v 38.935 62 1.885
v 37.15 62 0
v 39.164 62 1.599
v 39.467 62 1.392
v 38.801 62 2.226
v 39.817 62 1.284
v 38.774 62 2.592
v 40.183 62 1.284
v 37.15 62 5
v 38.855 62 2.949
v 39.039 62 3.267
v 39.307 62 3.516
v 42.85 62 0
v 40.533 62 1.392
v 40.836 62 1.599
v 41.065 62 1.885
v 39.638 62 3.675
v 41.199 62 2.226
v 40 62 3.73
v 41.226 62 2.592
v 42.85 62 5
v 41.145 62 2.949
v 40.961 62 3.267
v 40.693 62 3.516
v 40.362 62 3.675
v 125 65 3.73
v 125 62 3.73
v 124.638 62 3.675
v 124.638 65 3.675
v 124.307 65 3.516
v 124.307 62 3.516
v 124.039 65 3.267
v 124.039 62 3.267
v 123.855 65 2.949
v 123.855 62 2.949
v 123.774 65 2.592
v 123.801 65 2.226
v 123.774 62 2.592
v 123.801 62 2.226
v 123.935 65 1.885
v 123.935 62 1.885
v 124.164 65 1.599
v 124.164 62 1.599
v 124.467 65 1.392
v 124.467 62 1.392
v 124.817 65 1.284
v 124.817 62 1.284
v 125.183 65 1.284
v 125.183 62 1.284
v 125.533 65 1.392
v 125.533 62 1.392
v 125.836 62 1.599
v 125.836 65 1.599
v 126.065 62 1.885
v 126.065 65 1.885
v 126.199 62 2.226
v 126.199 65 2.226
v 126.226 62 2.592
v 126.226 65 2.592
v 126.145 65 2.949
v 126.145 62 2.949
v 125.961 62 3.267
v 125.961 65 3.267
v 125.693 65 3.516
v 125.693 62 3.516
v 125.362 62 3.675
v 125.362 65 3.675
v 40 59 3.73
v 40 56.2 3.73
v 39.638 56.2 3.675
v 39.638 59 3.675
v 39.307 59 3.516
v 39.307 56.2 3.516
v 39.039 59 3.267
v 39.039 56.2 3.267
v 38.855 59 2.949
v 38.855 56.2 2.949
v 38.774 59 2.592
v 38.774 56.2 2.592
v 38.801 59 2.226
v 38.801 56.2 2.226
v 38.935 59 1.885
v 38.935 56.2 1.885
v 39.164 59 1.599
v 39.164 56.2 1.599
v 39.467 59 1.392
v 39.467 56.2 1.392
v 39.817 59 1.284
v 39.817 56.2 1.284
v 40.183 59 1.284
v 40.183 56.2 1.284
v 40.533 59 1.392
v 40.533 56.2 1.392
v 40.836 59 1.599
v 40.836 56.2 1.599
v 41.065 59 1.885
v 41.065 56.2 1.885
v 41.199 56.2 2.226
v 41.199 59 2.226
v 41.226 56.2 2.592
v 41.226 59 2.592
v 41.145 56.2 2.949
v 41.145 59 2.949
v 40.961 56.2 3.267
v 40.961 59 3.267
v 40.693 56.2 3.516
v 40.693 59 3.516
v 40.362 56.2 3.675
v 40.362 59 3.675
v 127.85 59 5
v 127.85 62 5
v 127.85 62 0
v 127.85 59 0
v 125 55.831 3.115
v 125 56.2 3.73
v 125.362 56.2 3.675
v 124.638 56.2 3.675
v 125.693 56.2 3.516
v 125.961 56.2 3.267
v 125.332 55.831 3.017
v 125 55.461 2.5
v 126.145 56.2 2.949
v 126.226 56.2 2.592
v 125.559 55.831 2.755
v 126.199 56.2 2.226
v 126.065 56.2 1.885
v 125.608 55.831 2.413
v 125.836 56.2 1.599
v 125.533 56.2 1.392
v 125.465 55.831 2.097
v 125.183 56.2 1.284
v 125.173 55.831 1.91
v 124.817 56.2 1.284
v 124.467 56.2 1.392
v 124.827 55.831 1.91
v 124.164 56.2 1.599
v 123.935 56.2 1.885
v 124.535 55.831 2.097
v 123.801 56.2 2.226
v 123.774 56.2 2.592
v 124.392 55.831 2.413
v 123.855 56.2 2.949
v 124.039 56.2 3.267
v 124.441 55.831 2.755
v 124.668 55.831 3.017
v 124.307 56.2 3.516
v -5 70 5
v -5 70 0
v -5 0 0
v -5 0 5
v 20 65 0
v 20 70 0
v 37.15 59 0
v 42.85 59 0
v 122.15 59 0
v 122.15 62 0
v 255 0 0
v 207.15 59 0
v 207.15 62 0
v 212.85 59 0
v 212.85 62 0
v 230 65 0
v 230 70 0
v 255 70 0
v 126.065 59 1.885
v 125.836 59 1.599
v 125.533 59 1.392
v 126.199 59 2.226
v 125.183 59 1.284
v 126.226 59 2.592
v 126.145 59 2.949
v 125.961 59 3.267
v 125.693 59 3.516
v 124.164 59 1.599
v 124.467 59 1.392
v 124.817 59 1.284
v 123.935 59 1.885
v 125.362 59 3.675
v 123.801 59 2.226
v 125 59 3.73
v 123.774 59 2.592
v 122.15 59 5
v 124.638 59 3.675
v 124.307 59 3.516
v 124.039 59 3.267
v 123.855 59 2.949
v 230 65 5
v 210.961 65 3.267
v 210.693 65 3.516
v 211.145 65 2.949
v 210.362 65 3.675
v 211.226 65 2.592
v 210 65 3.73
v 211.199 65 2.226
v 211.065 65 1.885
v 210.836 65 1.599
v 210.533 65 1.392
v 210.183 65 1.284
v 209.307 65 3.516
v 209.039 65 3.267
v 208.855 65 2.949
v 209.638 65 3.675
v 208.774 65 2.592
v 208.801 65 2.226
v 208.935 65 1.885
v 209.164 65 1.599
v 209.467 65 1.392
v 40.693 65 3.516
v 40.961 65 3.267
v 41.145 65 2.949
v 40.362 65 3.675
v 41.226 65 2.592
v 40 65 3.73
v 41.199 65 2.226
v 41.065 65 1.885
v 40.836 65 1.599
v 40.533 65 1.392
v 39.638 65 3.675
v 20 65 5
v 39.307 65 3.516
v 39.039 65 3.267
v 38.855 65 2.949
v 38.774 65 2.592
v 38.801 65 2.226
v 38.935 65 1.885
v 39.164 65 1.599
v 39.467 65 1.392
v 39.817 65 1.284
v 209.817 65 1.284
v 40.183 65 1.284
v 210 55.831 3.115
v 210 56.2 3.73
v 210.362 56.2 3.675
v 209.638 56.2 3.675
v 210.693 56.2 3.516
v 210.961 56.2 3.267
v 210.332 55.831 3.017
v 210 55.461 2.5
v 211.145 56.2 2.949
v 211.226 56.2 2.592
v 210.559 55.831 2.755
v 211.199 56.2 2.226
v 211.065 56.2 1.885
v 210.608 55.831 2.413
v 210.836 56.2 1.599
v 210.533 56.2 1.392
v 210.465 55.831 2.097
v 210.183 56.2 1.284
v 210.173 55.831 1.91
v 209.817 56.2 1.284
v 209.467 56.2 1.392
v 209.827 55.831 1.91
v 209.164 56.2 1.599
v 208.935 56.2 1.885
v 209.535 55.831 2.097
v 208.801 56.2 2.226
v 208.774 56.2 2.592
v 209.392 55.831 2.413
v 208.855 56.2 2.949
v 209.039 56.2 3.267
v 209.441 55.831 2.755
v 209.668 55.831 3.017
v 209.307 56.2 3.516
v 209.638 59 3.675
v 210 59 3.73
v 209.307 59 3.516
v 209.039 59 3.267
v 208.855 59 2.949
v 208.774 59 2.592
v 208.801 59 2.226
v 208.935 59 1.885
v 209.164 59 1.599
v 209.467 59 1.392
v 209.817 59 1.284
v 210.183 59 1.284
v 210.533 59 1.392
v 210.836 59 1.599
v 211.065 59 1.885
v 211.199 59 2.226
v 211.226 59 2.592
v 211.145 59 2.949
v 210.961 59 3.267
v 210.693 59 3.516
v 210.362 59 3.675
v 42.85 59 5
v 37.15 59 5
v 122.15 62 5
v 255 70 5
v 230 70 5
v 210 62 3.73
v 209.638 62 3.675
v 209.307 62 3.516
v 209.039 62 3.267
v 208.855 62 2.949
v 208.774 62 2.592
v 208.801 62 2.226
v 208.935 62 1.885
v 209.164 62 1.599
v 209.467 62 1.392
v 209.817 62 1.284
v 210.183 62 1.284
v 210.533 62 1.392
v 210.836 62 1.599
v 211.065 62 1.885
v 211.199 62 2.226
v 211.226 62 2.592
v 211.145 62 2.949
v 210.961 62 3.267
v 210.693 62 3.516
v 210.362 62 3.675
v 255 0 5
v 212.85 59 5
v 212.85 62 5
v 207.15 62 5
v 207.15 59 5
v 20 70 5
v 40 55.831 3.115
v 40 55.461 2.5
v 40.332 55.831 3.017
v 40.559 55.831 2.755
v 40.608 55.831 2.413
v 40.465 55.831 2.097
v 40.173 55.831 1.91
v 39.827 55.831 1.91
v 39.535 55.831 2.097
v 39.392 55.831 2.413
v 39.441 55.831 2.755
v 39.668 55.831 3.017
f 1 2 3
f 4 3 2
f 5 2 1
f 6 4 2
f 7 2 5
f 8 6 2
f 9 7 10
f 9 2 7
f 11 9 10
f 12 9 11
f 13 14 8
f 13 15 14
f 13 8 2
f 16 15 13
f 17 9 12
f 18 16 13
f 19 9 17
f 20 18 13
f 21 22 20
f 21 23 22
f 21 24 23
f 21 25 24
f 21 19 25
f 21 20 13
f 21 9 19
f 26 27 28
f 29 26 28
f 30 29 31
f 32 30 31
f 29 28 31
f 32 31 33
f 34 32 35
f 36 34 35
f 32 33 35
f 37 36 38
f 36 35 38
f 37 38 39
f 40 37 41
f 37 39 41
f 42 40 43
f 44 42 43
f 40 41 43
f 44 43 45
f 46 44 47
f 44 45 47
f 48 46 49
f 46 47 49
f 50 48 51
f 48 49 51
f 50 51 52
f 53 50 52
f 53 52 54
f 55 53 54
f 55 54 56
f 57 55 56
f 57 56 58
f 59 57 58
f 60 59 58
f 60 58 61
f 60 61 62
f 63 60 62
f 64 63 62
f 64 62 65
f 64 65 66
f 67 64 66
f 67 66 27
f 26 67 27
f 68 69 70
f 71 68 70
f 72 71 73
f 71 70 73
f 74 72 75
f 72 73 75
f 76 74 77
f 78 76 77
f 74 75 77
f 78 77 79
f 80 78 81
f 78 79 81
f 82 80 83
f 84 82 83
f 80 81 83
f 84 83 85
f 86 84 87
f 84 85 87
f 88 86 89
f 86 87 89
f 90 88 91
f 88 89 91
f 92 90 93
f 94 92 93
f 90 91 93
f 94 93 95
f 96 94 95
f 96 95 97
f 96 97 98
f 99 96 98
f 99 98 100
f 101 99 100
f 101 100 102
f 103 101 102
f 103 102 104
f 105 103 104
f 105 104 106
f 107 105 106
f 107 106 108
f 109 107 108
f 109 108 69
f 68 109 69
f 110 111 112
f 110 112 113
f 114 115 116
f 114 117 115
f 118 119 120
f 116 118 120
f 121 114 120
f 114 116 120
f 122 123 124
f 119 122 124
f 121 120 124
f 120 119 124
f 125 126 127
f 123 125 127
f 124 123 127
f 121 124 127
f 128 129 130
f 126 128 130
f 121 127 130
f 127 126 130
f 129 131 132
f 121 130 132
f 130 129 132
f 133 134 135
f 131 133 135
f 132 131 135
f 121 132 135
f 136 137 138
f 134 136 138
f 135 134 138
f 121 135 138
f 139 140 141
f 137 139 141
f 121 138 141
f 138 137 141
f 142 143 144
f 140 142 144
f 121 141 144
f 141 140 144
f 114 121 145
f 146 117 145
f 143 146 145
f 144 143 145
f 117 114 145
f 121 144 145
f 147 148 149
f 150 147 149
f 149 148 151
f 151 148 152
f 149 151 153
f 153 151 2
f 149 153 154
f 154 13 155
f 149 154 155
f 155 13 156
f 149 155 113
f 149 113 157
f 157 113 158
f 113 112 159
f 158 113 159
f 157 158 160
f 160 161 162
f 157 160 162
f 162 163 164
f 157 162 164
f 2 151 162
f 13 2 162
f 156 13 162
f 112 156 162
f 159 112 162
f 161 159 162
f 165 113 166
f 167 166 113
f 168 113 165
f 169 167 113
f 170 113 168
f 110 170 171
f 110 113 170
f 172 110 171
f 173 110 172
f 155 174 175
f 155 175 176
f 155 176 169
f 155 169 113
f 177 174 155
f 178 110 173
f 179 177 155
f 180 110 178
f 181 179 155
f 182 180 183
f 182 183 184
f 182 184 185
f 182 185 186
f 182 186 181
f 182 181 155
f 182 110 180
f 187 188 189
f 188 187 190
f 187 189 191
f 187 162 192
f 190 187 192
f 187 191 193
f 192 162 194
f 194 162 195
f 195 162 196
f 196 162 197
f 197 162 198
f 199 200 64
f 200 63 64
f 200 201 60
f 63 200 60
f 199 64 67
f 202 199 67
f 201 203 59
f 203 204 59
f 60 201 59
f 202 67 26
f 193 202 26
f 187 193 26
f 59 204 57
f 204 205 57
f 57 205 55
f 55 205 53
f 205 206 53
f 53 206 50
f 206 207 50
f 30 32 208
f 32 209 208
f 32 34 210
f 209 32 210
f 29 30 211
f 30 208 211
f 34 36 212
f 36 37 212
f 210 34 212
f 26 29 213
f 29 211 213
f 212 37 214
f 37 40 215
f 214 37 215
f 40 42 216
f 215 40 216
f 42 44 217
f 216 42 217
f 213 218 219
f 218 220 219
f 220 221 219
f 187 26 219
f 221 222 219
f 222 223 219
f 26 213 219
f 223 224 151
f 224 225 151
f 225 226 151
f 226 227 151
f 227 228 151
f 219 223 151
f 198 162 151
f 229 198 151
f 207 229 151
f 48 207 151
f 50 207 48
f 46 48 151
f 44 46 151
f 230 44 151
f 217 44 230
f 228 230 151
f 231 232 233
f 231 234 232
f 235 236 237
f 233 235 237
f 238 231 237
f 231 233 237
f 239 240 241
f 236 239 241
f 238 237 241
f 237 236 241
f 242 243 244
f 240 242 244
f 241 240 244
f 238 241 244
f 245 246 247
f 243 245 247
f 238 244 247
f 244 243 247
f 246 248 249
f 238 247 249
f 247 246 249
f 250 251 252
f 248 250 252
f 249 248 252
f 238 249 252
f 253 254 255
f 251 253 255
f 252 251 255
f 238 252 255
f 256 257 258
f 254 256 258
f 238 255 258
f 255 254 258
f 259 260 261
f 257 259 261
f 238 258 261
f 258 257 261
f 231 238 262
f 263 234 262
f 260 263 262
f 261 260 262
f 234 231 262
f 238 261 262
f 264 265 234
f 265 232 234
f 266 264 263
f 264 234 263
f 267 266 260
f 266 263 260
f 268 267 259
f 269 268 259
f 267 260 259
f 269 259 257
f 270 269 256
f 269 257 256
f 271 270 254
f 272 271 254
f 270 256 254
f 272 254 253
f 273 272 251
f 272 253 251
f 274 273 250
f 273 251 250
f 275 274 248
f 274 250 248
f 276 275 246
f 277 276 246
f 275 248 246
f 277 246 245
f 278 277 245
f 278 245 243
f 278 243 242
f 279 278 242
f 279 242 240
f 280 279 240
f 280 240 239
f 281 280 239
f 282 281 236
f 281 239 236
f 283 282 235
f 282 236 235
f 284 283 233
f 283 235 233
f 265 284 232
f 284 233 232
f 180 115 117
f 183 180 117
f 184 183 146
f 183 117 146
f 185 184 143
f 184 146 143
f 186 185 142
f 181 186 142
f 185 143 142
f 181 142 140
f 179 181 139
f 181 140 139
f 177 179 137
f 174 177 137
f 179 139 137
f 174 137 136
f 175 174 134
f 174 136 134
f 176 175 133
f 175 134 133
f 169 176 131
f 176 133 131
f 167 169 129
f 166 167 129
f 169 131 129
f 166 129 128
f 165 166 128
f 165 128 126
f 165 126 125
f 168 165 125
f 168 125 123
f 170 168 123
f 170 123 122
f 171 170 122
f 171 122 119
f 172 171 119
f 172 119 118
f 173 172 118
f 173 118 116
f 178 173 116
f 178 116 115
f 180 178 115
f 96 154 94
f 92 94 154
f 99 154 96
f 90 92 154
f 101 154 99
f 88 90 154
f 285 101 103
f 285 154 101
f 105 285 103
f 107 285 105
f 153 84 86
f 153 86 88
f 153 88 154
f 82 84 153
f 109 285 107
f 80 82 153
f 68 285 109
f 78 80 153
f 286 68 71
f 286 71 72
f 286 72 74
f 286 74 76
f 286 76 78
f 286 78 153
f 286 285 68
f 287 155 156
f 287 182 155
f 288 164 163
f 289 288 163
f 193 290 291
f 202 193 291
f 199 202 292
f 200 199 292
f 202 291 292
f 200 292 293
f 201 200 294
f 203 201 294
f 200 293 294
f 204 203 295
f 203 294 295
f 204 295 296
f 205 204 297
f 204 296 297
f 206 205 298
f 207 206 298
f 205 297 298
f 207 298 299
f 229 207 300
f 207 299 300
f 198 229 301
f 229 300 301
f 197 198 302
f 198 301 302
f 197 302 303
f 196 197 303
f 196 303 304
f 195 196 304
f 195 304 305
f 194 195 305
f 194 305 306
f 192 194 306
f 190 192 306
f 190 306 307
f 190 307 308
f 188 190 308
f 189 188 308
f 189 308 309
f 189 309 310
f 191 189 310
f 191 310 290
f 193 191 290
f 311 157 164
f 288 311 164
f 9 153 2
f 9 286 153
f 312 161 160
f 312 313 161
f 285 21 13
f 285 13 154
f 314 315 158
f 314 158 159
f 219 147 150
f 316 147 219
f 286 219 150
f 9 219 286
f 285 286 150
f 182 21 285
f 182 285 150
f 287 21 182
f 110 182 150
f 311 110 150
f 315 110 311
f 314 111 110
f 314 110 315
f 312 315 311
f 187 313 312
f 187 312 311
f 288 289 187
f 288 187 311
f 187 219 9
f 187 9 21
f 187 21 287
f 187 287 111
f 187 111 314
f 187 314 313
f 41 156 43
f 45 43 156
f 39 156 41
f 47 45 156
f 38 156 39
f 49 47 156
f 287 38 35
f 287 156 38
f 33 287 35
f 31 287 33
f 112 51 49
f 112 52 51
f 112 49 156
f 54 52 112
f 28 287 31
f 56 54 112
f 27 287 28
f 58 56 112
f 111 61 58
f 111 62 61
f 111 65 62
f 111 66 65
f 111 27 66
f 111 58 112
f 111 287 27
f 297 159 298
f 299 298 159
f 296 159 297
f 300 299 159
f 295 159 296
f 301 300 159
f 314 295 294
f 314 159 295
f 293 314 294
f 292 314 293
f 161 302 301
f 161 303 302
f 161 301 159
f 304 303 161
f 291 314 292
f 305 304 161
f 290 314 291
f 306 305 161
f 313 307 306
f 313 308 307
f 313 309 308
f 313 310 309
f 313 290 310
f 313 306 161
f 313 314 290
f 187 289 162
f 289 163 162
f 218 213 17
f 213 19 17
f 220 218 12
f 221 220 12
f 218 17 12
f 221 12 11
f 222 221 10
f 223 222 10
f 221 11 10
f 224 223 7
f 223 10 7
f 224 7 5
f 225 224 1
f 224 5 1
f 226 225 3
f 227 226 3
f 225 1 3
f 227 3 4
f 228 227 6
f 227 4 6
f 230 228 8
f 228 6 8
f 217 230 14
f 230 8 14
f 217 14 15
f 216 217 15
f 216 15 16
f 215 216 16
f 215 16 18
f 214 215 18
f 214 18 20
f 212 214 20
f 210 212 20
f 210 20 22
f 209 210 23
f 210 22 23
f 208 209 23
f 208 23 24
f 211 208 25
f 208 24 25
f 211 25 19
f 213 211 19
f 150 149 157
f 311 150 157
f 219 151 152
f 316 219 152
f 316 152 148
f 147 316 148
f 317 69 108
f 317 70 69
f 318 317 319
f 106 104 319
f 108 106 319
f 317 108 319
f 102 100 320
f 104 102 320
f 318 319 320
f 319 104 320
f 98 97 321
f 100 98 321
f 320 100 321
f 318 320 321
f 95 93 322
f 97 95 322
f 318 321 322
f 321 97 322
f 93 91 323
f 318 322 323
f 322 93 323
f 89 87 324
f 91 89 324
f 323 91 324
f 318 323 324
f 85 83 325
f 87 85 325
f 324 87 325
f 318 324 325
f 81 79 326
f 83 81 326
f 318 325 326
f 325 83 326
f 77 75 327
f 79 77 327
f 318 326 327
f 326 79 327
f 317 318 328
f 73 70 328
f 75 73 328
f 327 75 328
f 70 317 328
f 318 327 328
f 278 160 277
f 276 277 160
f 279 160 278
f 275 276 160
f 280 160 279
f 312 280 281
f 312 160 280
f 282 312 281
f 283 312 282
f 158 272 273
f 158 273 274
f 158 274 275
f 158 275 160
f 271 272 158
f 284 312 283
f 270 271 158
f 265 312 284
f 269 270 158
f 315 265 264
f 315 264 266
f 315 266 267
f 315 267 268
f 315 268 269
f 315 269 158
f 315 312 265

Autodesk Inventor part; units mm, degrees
ref_plane "YZ Plane" through (0, 0, 0) normal (1, 0, 0) x (0, 1, 0)
ref_plane "XZ Plane" through (0, 0, 0) normal (0, 1, 0) x (-1, 0, 0)
ref_plane "XY Plane" through (0, 0, 0) normal (0, 0, 1) x (1, 0, 0)
ref_plane "Work Plane1" through (0, 0, 0) normal (0, 0, 1) x (1, 0, 0)
sketch "Sketch1" plane through (0, 0, 0) normal (0, 0, 1) x (1, 0, 0)
  line L0 (250, 0) -> (0, 0) construction
  line L1 (250, 0) -> (250, 20) construction
  line L2 (0, 20) -> (250, 20) construction
  line L3 (0, 0) -> (0, 20) construction
  line L4 (245, 20) -> (153.1686, 20) construction
  line L5 (245, 20) -> (245, 80) construction
  line L6 (153.1686, 80) -> (245, 80) construction
  line L7 (153.1686, 20) -> (153.1686, 80) construction
  line L8 (-5, 0) -> (255, 0)
  line L9 (255, 0) -> (255, 70)
  line L10 (255, 70) -> (230, 70)
  line L11 (230, 70) -> (230, 65)
  line L12 (230, 65) -> (20, 65)
  line L13 (20, 65) -> (20, 70)
  line L14 (20, 70) -> (-5, 70)
  line L15 (-5, 70) -> (-5, 0)
  dimension "d0" = 10
  dimension "d1" = 5
  dimension "d2" = 5
  dimension "d3" = 5
  dimension "d4" = 25
  dimension "d5" = 25
extrude "Extrusion1" add sketch "Sketch1" along normal blind 5
hole "Hole1" [suppressed]
hole "Hole2" [suppressed]
sketch "Sketch2" plane through (0, 0, 0) normal (0, 0, -1) x (-1, 0, 0)
  line L0 (0, 0) -> (-250, 0) construction
  line L1 (0, 0) -> (0, 20) construction
  line L2 (-250, 20) -> (0, 20) construction
  line L3 (-250, 0) -> (-250, 20) construction
  line L4 (5, 0) -> (-255, 0) construction
  line L5 (5, 70) -> (5, 0) construction
  line L6 (-20, 70) -> (5, 70) construction
  line L7 (-20, 65) -> (-20, 70) construction
  line L8 (-230, 65) -> (-20, 65) construction
  line L9 (-230, 70) -> (-230, 65) construction
  line L10 (-255, 70) -> (-230, 70) construction
  line L11 (-255, 0) -> (-255, 70) construction
  line L12 (-125, 20) -> (-125, 0) construction
  line L13 (-250, 10) -> (0, 10) construction
  point P0 (-125, 10)
  point P1 (-230, 10)
  point P2 (-20, 10)
  dimension "d30" = 20
  dimension "d31" = 20
hole "Hole3" [suppressed]
sketch "Sketch3" plane through (20, 65, 0) normal (0, 1, 0) x (1, 0, 0)
  line L0 (210, 0) -> (0, 0) construction
  line L1 (0, 0) -> (0, -5) construction
  line L2 (210, -5) -> (0, -5) construction
  line L3 (210, 0) -> (210, -5) construction
  line L4 (210, 0) -> (210, -5) construction
  line L5 (0, 0) -> (0, -5) construction
  line L6 (0, -2.5) -> (210, -2.5) construction
  line L7 (-25, -5) -> (235, -5) construction
  line L8 (105, -5) -> (105, 0) construction
  line L9 (-25, 0) -> (235, 0) construction
  point P0 (-20, 0)
  point P1 (105, -2.5)
  point P2 (20, -2.5)
  point P3 (190, -2.5)
  dimension "d39" = 20
  dimension "d40" = 20
hole "Hole4" at (125, 65, 2.5) at (40, 65, 2.5) at (210, 65, 2.5) direction (0, -1, 0) diameter 2.459 depth 8.8 tip angle 118 thread size "M3x0.5" class "6H" standard "ISO Metric profile"
sketch "Sketch4" plane through (0, 0, 5) normal (0, 0, 1) x (1, 0, 0)
  line L0 (41.2295, 56.2) -> (41.2295, 65) construction
  line L1 (38.7705, 56.2) -> (38.7705, 65) construction
  line L2 (126.2295, 56.2) -> (126.2295, 65) construction
  line L3 (123.7705, 56.2) -> (123.7705, 65) construction
  line L4 (208.7705, 56.2) -> (208.7705, 65) construction
  line L5 (211.2295, 56.2) -> (211.2295, 65) construction
  line L6 (37.15, 62) -> (42.85, 62)
  line L7 (42.85, 62) -> (42.85, 59)
  line L8 (42.85, 59) -> (37.15, 59)
  line L9 (37.15, 59) -> (37.15, 62)
  line L10 (38.7705, 65) -> (41.2295, 65) construction
  line L11 (230, 65) -> (20, 65) construction
  line L12 (40, 65) -> (40, 60.5) construction
  line L13 (122.15, 62) -> (127.85, 62)
  line L14 (127.85, 62) -> (127.85, 59)
  line L15 (127.85, 59) -> (122.15, 59)
  line L16 (122.15, 59) -> (122.15, 62)
  line L17 (123.7705, 65) -> (126.2295, 65) construction
  line L18 (125, 65) -> (125, 61.2984) construction
  line L19 (212.85, 62) -> (212.85, 59)
  line L20 (210, 65) -> (210, 58.9) construction
  line L21 (208.7705, 65) -> (211.2295, 65) construction
  line L22 (207.15, 62) -> (212.85, 62)
  line L23 (212.85, 59) -> (207.15, 59)
  line L24 (207.15, 59) -> (207.15, 62)
  point P0 (0, 0)
  dimension "d48" = 3
  dimension "d50" = 5.7
  dimension "d51" = 3
  dimension "d52" = 3
  dimension "d53" = 5.7
  dimension "d54" = 3
  dimension "d55" = 3
  dimension "d56" = 5.7
  dimension "d57" = 3
extrude "Extrusion2" cut sketch "Sketch4" against normal through all
sketch "Sketch5" plane through (0, 0, 5) normal (0, 0, 1) x (1, 0, 0)
  arc A0 (63, 35) -> (55, 35) centre (59, 35) ccw projected
  line L0 (63, 35) -> (63, 0) projected
  line L1 (55, 0) -> (55, 35) projected
  line L2 (55, 0) -> (63, 0)
  line L3 (-5, 0) -> (255, 0) projected
  point P0 (0, 0)
extrude "Extrusion3" [suppressed]
equation "\"d1\" = ABS_tolerance + plate_thickness"
equation "\"d2\" = plate_thickness + basic_plate_offset"
equation "\"d3\" = plate_thickness + basic_plate_offset"
equation "\"d5\" = d4"
equation "\"d6\" = plate_thickness"
equation "\"d40\" = d39"
equation "\"d52\" = d48"
equation "\"d53\" = d50"
equation "\"d55\" = d58"
equation "\"d56\" = d59"
equation "\"plate_thickness\" = 5"
equation "\"ABS_tolerance\" = 0"
equation "\"laser_cutter_thickness\" = 0.1"
equation "\"basic_plate_offser\" = 0.5"
equation "\"basic_plate_offset\" = 0"
equation "\"d58\" = 3"
equation "\"d59\" = 5.7"
properties part number "sides-02"
